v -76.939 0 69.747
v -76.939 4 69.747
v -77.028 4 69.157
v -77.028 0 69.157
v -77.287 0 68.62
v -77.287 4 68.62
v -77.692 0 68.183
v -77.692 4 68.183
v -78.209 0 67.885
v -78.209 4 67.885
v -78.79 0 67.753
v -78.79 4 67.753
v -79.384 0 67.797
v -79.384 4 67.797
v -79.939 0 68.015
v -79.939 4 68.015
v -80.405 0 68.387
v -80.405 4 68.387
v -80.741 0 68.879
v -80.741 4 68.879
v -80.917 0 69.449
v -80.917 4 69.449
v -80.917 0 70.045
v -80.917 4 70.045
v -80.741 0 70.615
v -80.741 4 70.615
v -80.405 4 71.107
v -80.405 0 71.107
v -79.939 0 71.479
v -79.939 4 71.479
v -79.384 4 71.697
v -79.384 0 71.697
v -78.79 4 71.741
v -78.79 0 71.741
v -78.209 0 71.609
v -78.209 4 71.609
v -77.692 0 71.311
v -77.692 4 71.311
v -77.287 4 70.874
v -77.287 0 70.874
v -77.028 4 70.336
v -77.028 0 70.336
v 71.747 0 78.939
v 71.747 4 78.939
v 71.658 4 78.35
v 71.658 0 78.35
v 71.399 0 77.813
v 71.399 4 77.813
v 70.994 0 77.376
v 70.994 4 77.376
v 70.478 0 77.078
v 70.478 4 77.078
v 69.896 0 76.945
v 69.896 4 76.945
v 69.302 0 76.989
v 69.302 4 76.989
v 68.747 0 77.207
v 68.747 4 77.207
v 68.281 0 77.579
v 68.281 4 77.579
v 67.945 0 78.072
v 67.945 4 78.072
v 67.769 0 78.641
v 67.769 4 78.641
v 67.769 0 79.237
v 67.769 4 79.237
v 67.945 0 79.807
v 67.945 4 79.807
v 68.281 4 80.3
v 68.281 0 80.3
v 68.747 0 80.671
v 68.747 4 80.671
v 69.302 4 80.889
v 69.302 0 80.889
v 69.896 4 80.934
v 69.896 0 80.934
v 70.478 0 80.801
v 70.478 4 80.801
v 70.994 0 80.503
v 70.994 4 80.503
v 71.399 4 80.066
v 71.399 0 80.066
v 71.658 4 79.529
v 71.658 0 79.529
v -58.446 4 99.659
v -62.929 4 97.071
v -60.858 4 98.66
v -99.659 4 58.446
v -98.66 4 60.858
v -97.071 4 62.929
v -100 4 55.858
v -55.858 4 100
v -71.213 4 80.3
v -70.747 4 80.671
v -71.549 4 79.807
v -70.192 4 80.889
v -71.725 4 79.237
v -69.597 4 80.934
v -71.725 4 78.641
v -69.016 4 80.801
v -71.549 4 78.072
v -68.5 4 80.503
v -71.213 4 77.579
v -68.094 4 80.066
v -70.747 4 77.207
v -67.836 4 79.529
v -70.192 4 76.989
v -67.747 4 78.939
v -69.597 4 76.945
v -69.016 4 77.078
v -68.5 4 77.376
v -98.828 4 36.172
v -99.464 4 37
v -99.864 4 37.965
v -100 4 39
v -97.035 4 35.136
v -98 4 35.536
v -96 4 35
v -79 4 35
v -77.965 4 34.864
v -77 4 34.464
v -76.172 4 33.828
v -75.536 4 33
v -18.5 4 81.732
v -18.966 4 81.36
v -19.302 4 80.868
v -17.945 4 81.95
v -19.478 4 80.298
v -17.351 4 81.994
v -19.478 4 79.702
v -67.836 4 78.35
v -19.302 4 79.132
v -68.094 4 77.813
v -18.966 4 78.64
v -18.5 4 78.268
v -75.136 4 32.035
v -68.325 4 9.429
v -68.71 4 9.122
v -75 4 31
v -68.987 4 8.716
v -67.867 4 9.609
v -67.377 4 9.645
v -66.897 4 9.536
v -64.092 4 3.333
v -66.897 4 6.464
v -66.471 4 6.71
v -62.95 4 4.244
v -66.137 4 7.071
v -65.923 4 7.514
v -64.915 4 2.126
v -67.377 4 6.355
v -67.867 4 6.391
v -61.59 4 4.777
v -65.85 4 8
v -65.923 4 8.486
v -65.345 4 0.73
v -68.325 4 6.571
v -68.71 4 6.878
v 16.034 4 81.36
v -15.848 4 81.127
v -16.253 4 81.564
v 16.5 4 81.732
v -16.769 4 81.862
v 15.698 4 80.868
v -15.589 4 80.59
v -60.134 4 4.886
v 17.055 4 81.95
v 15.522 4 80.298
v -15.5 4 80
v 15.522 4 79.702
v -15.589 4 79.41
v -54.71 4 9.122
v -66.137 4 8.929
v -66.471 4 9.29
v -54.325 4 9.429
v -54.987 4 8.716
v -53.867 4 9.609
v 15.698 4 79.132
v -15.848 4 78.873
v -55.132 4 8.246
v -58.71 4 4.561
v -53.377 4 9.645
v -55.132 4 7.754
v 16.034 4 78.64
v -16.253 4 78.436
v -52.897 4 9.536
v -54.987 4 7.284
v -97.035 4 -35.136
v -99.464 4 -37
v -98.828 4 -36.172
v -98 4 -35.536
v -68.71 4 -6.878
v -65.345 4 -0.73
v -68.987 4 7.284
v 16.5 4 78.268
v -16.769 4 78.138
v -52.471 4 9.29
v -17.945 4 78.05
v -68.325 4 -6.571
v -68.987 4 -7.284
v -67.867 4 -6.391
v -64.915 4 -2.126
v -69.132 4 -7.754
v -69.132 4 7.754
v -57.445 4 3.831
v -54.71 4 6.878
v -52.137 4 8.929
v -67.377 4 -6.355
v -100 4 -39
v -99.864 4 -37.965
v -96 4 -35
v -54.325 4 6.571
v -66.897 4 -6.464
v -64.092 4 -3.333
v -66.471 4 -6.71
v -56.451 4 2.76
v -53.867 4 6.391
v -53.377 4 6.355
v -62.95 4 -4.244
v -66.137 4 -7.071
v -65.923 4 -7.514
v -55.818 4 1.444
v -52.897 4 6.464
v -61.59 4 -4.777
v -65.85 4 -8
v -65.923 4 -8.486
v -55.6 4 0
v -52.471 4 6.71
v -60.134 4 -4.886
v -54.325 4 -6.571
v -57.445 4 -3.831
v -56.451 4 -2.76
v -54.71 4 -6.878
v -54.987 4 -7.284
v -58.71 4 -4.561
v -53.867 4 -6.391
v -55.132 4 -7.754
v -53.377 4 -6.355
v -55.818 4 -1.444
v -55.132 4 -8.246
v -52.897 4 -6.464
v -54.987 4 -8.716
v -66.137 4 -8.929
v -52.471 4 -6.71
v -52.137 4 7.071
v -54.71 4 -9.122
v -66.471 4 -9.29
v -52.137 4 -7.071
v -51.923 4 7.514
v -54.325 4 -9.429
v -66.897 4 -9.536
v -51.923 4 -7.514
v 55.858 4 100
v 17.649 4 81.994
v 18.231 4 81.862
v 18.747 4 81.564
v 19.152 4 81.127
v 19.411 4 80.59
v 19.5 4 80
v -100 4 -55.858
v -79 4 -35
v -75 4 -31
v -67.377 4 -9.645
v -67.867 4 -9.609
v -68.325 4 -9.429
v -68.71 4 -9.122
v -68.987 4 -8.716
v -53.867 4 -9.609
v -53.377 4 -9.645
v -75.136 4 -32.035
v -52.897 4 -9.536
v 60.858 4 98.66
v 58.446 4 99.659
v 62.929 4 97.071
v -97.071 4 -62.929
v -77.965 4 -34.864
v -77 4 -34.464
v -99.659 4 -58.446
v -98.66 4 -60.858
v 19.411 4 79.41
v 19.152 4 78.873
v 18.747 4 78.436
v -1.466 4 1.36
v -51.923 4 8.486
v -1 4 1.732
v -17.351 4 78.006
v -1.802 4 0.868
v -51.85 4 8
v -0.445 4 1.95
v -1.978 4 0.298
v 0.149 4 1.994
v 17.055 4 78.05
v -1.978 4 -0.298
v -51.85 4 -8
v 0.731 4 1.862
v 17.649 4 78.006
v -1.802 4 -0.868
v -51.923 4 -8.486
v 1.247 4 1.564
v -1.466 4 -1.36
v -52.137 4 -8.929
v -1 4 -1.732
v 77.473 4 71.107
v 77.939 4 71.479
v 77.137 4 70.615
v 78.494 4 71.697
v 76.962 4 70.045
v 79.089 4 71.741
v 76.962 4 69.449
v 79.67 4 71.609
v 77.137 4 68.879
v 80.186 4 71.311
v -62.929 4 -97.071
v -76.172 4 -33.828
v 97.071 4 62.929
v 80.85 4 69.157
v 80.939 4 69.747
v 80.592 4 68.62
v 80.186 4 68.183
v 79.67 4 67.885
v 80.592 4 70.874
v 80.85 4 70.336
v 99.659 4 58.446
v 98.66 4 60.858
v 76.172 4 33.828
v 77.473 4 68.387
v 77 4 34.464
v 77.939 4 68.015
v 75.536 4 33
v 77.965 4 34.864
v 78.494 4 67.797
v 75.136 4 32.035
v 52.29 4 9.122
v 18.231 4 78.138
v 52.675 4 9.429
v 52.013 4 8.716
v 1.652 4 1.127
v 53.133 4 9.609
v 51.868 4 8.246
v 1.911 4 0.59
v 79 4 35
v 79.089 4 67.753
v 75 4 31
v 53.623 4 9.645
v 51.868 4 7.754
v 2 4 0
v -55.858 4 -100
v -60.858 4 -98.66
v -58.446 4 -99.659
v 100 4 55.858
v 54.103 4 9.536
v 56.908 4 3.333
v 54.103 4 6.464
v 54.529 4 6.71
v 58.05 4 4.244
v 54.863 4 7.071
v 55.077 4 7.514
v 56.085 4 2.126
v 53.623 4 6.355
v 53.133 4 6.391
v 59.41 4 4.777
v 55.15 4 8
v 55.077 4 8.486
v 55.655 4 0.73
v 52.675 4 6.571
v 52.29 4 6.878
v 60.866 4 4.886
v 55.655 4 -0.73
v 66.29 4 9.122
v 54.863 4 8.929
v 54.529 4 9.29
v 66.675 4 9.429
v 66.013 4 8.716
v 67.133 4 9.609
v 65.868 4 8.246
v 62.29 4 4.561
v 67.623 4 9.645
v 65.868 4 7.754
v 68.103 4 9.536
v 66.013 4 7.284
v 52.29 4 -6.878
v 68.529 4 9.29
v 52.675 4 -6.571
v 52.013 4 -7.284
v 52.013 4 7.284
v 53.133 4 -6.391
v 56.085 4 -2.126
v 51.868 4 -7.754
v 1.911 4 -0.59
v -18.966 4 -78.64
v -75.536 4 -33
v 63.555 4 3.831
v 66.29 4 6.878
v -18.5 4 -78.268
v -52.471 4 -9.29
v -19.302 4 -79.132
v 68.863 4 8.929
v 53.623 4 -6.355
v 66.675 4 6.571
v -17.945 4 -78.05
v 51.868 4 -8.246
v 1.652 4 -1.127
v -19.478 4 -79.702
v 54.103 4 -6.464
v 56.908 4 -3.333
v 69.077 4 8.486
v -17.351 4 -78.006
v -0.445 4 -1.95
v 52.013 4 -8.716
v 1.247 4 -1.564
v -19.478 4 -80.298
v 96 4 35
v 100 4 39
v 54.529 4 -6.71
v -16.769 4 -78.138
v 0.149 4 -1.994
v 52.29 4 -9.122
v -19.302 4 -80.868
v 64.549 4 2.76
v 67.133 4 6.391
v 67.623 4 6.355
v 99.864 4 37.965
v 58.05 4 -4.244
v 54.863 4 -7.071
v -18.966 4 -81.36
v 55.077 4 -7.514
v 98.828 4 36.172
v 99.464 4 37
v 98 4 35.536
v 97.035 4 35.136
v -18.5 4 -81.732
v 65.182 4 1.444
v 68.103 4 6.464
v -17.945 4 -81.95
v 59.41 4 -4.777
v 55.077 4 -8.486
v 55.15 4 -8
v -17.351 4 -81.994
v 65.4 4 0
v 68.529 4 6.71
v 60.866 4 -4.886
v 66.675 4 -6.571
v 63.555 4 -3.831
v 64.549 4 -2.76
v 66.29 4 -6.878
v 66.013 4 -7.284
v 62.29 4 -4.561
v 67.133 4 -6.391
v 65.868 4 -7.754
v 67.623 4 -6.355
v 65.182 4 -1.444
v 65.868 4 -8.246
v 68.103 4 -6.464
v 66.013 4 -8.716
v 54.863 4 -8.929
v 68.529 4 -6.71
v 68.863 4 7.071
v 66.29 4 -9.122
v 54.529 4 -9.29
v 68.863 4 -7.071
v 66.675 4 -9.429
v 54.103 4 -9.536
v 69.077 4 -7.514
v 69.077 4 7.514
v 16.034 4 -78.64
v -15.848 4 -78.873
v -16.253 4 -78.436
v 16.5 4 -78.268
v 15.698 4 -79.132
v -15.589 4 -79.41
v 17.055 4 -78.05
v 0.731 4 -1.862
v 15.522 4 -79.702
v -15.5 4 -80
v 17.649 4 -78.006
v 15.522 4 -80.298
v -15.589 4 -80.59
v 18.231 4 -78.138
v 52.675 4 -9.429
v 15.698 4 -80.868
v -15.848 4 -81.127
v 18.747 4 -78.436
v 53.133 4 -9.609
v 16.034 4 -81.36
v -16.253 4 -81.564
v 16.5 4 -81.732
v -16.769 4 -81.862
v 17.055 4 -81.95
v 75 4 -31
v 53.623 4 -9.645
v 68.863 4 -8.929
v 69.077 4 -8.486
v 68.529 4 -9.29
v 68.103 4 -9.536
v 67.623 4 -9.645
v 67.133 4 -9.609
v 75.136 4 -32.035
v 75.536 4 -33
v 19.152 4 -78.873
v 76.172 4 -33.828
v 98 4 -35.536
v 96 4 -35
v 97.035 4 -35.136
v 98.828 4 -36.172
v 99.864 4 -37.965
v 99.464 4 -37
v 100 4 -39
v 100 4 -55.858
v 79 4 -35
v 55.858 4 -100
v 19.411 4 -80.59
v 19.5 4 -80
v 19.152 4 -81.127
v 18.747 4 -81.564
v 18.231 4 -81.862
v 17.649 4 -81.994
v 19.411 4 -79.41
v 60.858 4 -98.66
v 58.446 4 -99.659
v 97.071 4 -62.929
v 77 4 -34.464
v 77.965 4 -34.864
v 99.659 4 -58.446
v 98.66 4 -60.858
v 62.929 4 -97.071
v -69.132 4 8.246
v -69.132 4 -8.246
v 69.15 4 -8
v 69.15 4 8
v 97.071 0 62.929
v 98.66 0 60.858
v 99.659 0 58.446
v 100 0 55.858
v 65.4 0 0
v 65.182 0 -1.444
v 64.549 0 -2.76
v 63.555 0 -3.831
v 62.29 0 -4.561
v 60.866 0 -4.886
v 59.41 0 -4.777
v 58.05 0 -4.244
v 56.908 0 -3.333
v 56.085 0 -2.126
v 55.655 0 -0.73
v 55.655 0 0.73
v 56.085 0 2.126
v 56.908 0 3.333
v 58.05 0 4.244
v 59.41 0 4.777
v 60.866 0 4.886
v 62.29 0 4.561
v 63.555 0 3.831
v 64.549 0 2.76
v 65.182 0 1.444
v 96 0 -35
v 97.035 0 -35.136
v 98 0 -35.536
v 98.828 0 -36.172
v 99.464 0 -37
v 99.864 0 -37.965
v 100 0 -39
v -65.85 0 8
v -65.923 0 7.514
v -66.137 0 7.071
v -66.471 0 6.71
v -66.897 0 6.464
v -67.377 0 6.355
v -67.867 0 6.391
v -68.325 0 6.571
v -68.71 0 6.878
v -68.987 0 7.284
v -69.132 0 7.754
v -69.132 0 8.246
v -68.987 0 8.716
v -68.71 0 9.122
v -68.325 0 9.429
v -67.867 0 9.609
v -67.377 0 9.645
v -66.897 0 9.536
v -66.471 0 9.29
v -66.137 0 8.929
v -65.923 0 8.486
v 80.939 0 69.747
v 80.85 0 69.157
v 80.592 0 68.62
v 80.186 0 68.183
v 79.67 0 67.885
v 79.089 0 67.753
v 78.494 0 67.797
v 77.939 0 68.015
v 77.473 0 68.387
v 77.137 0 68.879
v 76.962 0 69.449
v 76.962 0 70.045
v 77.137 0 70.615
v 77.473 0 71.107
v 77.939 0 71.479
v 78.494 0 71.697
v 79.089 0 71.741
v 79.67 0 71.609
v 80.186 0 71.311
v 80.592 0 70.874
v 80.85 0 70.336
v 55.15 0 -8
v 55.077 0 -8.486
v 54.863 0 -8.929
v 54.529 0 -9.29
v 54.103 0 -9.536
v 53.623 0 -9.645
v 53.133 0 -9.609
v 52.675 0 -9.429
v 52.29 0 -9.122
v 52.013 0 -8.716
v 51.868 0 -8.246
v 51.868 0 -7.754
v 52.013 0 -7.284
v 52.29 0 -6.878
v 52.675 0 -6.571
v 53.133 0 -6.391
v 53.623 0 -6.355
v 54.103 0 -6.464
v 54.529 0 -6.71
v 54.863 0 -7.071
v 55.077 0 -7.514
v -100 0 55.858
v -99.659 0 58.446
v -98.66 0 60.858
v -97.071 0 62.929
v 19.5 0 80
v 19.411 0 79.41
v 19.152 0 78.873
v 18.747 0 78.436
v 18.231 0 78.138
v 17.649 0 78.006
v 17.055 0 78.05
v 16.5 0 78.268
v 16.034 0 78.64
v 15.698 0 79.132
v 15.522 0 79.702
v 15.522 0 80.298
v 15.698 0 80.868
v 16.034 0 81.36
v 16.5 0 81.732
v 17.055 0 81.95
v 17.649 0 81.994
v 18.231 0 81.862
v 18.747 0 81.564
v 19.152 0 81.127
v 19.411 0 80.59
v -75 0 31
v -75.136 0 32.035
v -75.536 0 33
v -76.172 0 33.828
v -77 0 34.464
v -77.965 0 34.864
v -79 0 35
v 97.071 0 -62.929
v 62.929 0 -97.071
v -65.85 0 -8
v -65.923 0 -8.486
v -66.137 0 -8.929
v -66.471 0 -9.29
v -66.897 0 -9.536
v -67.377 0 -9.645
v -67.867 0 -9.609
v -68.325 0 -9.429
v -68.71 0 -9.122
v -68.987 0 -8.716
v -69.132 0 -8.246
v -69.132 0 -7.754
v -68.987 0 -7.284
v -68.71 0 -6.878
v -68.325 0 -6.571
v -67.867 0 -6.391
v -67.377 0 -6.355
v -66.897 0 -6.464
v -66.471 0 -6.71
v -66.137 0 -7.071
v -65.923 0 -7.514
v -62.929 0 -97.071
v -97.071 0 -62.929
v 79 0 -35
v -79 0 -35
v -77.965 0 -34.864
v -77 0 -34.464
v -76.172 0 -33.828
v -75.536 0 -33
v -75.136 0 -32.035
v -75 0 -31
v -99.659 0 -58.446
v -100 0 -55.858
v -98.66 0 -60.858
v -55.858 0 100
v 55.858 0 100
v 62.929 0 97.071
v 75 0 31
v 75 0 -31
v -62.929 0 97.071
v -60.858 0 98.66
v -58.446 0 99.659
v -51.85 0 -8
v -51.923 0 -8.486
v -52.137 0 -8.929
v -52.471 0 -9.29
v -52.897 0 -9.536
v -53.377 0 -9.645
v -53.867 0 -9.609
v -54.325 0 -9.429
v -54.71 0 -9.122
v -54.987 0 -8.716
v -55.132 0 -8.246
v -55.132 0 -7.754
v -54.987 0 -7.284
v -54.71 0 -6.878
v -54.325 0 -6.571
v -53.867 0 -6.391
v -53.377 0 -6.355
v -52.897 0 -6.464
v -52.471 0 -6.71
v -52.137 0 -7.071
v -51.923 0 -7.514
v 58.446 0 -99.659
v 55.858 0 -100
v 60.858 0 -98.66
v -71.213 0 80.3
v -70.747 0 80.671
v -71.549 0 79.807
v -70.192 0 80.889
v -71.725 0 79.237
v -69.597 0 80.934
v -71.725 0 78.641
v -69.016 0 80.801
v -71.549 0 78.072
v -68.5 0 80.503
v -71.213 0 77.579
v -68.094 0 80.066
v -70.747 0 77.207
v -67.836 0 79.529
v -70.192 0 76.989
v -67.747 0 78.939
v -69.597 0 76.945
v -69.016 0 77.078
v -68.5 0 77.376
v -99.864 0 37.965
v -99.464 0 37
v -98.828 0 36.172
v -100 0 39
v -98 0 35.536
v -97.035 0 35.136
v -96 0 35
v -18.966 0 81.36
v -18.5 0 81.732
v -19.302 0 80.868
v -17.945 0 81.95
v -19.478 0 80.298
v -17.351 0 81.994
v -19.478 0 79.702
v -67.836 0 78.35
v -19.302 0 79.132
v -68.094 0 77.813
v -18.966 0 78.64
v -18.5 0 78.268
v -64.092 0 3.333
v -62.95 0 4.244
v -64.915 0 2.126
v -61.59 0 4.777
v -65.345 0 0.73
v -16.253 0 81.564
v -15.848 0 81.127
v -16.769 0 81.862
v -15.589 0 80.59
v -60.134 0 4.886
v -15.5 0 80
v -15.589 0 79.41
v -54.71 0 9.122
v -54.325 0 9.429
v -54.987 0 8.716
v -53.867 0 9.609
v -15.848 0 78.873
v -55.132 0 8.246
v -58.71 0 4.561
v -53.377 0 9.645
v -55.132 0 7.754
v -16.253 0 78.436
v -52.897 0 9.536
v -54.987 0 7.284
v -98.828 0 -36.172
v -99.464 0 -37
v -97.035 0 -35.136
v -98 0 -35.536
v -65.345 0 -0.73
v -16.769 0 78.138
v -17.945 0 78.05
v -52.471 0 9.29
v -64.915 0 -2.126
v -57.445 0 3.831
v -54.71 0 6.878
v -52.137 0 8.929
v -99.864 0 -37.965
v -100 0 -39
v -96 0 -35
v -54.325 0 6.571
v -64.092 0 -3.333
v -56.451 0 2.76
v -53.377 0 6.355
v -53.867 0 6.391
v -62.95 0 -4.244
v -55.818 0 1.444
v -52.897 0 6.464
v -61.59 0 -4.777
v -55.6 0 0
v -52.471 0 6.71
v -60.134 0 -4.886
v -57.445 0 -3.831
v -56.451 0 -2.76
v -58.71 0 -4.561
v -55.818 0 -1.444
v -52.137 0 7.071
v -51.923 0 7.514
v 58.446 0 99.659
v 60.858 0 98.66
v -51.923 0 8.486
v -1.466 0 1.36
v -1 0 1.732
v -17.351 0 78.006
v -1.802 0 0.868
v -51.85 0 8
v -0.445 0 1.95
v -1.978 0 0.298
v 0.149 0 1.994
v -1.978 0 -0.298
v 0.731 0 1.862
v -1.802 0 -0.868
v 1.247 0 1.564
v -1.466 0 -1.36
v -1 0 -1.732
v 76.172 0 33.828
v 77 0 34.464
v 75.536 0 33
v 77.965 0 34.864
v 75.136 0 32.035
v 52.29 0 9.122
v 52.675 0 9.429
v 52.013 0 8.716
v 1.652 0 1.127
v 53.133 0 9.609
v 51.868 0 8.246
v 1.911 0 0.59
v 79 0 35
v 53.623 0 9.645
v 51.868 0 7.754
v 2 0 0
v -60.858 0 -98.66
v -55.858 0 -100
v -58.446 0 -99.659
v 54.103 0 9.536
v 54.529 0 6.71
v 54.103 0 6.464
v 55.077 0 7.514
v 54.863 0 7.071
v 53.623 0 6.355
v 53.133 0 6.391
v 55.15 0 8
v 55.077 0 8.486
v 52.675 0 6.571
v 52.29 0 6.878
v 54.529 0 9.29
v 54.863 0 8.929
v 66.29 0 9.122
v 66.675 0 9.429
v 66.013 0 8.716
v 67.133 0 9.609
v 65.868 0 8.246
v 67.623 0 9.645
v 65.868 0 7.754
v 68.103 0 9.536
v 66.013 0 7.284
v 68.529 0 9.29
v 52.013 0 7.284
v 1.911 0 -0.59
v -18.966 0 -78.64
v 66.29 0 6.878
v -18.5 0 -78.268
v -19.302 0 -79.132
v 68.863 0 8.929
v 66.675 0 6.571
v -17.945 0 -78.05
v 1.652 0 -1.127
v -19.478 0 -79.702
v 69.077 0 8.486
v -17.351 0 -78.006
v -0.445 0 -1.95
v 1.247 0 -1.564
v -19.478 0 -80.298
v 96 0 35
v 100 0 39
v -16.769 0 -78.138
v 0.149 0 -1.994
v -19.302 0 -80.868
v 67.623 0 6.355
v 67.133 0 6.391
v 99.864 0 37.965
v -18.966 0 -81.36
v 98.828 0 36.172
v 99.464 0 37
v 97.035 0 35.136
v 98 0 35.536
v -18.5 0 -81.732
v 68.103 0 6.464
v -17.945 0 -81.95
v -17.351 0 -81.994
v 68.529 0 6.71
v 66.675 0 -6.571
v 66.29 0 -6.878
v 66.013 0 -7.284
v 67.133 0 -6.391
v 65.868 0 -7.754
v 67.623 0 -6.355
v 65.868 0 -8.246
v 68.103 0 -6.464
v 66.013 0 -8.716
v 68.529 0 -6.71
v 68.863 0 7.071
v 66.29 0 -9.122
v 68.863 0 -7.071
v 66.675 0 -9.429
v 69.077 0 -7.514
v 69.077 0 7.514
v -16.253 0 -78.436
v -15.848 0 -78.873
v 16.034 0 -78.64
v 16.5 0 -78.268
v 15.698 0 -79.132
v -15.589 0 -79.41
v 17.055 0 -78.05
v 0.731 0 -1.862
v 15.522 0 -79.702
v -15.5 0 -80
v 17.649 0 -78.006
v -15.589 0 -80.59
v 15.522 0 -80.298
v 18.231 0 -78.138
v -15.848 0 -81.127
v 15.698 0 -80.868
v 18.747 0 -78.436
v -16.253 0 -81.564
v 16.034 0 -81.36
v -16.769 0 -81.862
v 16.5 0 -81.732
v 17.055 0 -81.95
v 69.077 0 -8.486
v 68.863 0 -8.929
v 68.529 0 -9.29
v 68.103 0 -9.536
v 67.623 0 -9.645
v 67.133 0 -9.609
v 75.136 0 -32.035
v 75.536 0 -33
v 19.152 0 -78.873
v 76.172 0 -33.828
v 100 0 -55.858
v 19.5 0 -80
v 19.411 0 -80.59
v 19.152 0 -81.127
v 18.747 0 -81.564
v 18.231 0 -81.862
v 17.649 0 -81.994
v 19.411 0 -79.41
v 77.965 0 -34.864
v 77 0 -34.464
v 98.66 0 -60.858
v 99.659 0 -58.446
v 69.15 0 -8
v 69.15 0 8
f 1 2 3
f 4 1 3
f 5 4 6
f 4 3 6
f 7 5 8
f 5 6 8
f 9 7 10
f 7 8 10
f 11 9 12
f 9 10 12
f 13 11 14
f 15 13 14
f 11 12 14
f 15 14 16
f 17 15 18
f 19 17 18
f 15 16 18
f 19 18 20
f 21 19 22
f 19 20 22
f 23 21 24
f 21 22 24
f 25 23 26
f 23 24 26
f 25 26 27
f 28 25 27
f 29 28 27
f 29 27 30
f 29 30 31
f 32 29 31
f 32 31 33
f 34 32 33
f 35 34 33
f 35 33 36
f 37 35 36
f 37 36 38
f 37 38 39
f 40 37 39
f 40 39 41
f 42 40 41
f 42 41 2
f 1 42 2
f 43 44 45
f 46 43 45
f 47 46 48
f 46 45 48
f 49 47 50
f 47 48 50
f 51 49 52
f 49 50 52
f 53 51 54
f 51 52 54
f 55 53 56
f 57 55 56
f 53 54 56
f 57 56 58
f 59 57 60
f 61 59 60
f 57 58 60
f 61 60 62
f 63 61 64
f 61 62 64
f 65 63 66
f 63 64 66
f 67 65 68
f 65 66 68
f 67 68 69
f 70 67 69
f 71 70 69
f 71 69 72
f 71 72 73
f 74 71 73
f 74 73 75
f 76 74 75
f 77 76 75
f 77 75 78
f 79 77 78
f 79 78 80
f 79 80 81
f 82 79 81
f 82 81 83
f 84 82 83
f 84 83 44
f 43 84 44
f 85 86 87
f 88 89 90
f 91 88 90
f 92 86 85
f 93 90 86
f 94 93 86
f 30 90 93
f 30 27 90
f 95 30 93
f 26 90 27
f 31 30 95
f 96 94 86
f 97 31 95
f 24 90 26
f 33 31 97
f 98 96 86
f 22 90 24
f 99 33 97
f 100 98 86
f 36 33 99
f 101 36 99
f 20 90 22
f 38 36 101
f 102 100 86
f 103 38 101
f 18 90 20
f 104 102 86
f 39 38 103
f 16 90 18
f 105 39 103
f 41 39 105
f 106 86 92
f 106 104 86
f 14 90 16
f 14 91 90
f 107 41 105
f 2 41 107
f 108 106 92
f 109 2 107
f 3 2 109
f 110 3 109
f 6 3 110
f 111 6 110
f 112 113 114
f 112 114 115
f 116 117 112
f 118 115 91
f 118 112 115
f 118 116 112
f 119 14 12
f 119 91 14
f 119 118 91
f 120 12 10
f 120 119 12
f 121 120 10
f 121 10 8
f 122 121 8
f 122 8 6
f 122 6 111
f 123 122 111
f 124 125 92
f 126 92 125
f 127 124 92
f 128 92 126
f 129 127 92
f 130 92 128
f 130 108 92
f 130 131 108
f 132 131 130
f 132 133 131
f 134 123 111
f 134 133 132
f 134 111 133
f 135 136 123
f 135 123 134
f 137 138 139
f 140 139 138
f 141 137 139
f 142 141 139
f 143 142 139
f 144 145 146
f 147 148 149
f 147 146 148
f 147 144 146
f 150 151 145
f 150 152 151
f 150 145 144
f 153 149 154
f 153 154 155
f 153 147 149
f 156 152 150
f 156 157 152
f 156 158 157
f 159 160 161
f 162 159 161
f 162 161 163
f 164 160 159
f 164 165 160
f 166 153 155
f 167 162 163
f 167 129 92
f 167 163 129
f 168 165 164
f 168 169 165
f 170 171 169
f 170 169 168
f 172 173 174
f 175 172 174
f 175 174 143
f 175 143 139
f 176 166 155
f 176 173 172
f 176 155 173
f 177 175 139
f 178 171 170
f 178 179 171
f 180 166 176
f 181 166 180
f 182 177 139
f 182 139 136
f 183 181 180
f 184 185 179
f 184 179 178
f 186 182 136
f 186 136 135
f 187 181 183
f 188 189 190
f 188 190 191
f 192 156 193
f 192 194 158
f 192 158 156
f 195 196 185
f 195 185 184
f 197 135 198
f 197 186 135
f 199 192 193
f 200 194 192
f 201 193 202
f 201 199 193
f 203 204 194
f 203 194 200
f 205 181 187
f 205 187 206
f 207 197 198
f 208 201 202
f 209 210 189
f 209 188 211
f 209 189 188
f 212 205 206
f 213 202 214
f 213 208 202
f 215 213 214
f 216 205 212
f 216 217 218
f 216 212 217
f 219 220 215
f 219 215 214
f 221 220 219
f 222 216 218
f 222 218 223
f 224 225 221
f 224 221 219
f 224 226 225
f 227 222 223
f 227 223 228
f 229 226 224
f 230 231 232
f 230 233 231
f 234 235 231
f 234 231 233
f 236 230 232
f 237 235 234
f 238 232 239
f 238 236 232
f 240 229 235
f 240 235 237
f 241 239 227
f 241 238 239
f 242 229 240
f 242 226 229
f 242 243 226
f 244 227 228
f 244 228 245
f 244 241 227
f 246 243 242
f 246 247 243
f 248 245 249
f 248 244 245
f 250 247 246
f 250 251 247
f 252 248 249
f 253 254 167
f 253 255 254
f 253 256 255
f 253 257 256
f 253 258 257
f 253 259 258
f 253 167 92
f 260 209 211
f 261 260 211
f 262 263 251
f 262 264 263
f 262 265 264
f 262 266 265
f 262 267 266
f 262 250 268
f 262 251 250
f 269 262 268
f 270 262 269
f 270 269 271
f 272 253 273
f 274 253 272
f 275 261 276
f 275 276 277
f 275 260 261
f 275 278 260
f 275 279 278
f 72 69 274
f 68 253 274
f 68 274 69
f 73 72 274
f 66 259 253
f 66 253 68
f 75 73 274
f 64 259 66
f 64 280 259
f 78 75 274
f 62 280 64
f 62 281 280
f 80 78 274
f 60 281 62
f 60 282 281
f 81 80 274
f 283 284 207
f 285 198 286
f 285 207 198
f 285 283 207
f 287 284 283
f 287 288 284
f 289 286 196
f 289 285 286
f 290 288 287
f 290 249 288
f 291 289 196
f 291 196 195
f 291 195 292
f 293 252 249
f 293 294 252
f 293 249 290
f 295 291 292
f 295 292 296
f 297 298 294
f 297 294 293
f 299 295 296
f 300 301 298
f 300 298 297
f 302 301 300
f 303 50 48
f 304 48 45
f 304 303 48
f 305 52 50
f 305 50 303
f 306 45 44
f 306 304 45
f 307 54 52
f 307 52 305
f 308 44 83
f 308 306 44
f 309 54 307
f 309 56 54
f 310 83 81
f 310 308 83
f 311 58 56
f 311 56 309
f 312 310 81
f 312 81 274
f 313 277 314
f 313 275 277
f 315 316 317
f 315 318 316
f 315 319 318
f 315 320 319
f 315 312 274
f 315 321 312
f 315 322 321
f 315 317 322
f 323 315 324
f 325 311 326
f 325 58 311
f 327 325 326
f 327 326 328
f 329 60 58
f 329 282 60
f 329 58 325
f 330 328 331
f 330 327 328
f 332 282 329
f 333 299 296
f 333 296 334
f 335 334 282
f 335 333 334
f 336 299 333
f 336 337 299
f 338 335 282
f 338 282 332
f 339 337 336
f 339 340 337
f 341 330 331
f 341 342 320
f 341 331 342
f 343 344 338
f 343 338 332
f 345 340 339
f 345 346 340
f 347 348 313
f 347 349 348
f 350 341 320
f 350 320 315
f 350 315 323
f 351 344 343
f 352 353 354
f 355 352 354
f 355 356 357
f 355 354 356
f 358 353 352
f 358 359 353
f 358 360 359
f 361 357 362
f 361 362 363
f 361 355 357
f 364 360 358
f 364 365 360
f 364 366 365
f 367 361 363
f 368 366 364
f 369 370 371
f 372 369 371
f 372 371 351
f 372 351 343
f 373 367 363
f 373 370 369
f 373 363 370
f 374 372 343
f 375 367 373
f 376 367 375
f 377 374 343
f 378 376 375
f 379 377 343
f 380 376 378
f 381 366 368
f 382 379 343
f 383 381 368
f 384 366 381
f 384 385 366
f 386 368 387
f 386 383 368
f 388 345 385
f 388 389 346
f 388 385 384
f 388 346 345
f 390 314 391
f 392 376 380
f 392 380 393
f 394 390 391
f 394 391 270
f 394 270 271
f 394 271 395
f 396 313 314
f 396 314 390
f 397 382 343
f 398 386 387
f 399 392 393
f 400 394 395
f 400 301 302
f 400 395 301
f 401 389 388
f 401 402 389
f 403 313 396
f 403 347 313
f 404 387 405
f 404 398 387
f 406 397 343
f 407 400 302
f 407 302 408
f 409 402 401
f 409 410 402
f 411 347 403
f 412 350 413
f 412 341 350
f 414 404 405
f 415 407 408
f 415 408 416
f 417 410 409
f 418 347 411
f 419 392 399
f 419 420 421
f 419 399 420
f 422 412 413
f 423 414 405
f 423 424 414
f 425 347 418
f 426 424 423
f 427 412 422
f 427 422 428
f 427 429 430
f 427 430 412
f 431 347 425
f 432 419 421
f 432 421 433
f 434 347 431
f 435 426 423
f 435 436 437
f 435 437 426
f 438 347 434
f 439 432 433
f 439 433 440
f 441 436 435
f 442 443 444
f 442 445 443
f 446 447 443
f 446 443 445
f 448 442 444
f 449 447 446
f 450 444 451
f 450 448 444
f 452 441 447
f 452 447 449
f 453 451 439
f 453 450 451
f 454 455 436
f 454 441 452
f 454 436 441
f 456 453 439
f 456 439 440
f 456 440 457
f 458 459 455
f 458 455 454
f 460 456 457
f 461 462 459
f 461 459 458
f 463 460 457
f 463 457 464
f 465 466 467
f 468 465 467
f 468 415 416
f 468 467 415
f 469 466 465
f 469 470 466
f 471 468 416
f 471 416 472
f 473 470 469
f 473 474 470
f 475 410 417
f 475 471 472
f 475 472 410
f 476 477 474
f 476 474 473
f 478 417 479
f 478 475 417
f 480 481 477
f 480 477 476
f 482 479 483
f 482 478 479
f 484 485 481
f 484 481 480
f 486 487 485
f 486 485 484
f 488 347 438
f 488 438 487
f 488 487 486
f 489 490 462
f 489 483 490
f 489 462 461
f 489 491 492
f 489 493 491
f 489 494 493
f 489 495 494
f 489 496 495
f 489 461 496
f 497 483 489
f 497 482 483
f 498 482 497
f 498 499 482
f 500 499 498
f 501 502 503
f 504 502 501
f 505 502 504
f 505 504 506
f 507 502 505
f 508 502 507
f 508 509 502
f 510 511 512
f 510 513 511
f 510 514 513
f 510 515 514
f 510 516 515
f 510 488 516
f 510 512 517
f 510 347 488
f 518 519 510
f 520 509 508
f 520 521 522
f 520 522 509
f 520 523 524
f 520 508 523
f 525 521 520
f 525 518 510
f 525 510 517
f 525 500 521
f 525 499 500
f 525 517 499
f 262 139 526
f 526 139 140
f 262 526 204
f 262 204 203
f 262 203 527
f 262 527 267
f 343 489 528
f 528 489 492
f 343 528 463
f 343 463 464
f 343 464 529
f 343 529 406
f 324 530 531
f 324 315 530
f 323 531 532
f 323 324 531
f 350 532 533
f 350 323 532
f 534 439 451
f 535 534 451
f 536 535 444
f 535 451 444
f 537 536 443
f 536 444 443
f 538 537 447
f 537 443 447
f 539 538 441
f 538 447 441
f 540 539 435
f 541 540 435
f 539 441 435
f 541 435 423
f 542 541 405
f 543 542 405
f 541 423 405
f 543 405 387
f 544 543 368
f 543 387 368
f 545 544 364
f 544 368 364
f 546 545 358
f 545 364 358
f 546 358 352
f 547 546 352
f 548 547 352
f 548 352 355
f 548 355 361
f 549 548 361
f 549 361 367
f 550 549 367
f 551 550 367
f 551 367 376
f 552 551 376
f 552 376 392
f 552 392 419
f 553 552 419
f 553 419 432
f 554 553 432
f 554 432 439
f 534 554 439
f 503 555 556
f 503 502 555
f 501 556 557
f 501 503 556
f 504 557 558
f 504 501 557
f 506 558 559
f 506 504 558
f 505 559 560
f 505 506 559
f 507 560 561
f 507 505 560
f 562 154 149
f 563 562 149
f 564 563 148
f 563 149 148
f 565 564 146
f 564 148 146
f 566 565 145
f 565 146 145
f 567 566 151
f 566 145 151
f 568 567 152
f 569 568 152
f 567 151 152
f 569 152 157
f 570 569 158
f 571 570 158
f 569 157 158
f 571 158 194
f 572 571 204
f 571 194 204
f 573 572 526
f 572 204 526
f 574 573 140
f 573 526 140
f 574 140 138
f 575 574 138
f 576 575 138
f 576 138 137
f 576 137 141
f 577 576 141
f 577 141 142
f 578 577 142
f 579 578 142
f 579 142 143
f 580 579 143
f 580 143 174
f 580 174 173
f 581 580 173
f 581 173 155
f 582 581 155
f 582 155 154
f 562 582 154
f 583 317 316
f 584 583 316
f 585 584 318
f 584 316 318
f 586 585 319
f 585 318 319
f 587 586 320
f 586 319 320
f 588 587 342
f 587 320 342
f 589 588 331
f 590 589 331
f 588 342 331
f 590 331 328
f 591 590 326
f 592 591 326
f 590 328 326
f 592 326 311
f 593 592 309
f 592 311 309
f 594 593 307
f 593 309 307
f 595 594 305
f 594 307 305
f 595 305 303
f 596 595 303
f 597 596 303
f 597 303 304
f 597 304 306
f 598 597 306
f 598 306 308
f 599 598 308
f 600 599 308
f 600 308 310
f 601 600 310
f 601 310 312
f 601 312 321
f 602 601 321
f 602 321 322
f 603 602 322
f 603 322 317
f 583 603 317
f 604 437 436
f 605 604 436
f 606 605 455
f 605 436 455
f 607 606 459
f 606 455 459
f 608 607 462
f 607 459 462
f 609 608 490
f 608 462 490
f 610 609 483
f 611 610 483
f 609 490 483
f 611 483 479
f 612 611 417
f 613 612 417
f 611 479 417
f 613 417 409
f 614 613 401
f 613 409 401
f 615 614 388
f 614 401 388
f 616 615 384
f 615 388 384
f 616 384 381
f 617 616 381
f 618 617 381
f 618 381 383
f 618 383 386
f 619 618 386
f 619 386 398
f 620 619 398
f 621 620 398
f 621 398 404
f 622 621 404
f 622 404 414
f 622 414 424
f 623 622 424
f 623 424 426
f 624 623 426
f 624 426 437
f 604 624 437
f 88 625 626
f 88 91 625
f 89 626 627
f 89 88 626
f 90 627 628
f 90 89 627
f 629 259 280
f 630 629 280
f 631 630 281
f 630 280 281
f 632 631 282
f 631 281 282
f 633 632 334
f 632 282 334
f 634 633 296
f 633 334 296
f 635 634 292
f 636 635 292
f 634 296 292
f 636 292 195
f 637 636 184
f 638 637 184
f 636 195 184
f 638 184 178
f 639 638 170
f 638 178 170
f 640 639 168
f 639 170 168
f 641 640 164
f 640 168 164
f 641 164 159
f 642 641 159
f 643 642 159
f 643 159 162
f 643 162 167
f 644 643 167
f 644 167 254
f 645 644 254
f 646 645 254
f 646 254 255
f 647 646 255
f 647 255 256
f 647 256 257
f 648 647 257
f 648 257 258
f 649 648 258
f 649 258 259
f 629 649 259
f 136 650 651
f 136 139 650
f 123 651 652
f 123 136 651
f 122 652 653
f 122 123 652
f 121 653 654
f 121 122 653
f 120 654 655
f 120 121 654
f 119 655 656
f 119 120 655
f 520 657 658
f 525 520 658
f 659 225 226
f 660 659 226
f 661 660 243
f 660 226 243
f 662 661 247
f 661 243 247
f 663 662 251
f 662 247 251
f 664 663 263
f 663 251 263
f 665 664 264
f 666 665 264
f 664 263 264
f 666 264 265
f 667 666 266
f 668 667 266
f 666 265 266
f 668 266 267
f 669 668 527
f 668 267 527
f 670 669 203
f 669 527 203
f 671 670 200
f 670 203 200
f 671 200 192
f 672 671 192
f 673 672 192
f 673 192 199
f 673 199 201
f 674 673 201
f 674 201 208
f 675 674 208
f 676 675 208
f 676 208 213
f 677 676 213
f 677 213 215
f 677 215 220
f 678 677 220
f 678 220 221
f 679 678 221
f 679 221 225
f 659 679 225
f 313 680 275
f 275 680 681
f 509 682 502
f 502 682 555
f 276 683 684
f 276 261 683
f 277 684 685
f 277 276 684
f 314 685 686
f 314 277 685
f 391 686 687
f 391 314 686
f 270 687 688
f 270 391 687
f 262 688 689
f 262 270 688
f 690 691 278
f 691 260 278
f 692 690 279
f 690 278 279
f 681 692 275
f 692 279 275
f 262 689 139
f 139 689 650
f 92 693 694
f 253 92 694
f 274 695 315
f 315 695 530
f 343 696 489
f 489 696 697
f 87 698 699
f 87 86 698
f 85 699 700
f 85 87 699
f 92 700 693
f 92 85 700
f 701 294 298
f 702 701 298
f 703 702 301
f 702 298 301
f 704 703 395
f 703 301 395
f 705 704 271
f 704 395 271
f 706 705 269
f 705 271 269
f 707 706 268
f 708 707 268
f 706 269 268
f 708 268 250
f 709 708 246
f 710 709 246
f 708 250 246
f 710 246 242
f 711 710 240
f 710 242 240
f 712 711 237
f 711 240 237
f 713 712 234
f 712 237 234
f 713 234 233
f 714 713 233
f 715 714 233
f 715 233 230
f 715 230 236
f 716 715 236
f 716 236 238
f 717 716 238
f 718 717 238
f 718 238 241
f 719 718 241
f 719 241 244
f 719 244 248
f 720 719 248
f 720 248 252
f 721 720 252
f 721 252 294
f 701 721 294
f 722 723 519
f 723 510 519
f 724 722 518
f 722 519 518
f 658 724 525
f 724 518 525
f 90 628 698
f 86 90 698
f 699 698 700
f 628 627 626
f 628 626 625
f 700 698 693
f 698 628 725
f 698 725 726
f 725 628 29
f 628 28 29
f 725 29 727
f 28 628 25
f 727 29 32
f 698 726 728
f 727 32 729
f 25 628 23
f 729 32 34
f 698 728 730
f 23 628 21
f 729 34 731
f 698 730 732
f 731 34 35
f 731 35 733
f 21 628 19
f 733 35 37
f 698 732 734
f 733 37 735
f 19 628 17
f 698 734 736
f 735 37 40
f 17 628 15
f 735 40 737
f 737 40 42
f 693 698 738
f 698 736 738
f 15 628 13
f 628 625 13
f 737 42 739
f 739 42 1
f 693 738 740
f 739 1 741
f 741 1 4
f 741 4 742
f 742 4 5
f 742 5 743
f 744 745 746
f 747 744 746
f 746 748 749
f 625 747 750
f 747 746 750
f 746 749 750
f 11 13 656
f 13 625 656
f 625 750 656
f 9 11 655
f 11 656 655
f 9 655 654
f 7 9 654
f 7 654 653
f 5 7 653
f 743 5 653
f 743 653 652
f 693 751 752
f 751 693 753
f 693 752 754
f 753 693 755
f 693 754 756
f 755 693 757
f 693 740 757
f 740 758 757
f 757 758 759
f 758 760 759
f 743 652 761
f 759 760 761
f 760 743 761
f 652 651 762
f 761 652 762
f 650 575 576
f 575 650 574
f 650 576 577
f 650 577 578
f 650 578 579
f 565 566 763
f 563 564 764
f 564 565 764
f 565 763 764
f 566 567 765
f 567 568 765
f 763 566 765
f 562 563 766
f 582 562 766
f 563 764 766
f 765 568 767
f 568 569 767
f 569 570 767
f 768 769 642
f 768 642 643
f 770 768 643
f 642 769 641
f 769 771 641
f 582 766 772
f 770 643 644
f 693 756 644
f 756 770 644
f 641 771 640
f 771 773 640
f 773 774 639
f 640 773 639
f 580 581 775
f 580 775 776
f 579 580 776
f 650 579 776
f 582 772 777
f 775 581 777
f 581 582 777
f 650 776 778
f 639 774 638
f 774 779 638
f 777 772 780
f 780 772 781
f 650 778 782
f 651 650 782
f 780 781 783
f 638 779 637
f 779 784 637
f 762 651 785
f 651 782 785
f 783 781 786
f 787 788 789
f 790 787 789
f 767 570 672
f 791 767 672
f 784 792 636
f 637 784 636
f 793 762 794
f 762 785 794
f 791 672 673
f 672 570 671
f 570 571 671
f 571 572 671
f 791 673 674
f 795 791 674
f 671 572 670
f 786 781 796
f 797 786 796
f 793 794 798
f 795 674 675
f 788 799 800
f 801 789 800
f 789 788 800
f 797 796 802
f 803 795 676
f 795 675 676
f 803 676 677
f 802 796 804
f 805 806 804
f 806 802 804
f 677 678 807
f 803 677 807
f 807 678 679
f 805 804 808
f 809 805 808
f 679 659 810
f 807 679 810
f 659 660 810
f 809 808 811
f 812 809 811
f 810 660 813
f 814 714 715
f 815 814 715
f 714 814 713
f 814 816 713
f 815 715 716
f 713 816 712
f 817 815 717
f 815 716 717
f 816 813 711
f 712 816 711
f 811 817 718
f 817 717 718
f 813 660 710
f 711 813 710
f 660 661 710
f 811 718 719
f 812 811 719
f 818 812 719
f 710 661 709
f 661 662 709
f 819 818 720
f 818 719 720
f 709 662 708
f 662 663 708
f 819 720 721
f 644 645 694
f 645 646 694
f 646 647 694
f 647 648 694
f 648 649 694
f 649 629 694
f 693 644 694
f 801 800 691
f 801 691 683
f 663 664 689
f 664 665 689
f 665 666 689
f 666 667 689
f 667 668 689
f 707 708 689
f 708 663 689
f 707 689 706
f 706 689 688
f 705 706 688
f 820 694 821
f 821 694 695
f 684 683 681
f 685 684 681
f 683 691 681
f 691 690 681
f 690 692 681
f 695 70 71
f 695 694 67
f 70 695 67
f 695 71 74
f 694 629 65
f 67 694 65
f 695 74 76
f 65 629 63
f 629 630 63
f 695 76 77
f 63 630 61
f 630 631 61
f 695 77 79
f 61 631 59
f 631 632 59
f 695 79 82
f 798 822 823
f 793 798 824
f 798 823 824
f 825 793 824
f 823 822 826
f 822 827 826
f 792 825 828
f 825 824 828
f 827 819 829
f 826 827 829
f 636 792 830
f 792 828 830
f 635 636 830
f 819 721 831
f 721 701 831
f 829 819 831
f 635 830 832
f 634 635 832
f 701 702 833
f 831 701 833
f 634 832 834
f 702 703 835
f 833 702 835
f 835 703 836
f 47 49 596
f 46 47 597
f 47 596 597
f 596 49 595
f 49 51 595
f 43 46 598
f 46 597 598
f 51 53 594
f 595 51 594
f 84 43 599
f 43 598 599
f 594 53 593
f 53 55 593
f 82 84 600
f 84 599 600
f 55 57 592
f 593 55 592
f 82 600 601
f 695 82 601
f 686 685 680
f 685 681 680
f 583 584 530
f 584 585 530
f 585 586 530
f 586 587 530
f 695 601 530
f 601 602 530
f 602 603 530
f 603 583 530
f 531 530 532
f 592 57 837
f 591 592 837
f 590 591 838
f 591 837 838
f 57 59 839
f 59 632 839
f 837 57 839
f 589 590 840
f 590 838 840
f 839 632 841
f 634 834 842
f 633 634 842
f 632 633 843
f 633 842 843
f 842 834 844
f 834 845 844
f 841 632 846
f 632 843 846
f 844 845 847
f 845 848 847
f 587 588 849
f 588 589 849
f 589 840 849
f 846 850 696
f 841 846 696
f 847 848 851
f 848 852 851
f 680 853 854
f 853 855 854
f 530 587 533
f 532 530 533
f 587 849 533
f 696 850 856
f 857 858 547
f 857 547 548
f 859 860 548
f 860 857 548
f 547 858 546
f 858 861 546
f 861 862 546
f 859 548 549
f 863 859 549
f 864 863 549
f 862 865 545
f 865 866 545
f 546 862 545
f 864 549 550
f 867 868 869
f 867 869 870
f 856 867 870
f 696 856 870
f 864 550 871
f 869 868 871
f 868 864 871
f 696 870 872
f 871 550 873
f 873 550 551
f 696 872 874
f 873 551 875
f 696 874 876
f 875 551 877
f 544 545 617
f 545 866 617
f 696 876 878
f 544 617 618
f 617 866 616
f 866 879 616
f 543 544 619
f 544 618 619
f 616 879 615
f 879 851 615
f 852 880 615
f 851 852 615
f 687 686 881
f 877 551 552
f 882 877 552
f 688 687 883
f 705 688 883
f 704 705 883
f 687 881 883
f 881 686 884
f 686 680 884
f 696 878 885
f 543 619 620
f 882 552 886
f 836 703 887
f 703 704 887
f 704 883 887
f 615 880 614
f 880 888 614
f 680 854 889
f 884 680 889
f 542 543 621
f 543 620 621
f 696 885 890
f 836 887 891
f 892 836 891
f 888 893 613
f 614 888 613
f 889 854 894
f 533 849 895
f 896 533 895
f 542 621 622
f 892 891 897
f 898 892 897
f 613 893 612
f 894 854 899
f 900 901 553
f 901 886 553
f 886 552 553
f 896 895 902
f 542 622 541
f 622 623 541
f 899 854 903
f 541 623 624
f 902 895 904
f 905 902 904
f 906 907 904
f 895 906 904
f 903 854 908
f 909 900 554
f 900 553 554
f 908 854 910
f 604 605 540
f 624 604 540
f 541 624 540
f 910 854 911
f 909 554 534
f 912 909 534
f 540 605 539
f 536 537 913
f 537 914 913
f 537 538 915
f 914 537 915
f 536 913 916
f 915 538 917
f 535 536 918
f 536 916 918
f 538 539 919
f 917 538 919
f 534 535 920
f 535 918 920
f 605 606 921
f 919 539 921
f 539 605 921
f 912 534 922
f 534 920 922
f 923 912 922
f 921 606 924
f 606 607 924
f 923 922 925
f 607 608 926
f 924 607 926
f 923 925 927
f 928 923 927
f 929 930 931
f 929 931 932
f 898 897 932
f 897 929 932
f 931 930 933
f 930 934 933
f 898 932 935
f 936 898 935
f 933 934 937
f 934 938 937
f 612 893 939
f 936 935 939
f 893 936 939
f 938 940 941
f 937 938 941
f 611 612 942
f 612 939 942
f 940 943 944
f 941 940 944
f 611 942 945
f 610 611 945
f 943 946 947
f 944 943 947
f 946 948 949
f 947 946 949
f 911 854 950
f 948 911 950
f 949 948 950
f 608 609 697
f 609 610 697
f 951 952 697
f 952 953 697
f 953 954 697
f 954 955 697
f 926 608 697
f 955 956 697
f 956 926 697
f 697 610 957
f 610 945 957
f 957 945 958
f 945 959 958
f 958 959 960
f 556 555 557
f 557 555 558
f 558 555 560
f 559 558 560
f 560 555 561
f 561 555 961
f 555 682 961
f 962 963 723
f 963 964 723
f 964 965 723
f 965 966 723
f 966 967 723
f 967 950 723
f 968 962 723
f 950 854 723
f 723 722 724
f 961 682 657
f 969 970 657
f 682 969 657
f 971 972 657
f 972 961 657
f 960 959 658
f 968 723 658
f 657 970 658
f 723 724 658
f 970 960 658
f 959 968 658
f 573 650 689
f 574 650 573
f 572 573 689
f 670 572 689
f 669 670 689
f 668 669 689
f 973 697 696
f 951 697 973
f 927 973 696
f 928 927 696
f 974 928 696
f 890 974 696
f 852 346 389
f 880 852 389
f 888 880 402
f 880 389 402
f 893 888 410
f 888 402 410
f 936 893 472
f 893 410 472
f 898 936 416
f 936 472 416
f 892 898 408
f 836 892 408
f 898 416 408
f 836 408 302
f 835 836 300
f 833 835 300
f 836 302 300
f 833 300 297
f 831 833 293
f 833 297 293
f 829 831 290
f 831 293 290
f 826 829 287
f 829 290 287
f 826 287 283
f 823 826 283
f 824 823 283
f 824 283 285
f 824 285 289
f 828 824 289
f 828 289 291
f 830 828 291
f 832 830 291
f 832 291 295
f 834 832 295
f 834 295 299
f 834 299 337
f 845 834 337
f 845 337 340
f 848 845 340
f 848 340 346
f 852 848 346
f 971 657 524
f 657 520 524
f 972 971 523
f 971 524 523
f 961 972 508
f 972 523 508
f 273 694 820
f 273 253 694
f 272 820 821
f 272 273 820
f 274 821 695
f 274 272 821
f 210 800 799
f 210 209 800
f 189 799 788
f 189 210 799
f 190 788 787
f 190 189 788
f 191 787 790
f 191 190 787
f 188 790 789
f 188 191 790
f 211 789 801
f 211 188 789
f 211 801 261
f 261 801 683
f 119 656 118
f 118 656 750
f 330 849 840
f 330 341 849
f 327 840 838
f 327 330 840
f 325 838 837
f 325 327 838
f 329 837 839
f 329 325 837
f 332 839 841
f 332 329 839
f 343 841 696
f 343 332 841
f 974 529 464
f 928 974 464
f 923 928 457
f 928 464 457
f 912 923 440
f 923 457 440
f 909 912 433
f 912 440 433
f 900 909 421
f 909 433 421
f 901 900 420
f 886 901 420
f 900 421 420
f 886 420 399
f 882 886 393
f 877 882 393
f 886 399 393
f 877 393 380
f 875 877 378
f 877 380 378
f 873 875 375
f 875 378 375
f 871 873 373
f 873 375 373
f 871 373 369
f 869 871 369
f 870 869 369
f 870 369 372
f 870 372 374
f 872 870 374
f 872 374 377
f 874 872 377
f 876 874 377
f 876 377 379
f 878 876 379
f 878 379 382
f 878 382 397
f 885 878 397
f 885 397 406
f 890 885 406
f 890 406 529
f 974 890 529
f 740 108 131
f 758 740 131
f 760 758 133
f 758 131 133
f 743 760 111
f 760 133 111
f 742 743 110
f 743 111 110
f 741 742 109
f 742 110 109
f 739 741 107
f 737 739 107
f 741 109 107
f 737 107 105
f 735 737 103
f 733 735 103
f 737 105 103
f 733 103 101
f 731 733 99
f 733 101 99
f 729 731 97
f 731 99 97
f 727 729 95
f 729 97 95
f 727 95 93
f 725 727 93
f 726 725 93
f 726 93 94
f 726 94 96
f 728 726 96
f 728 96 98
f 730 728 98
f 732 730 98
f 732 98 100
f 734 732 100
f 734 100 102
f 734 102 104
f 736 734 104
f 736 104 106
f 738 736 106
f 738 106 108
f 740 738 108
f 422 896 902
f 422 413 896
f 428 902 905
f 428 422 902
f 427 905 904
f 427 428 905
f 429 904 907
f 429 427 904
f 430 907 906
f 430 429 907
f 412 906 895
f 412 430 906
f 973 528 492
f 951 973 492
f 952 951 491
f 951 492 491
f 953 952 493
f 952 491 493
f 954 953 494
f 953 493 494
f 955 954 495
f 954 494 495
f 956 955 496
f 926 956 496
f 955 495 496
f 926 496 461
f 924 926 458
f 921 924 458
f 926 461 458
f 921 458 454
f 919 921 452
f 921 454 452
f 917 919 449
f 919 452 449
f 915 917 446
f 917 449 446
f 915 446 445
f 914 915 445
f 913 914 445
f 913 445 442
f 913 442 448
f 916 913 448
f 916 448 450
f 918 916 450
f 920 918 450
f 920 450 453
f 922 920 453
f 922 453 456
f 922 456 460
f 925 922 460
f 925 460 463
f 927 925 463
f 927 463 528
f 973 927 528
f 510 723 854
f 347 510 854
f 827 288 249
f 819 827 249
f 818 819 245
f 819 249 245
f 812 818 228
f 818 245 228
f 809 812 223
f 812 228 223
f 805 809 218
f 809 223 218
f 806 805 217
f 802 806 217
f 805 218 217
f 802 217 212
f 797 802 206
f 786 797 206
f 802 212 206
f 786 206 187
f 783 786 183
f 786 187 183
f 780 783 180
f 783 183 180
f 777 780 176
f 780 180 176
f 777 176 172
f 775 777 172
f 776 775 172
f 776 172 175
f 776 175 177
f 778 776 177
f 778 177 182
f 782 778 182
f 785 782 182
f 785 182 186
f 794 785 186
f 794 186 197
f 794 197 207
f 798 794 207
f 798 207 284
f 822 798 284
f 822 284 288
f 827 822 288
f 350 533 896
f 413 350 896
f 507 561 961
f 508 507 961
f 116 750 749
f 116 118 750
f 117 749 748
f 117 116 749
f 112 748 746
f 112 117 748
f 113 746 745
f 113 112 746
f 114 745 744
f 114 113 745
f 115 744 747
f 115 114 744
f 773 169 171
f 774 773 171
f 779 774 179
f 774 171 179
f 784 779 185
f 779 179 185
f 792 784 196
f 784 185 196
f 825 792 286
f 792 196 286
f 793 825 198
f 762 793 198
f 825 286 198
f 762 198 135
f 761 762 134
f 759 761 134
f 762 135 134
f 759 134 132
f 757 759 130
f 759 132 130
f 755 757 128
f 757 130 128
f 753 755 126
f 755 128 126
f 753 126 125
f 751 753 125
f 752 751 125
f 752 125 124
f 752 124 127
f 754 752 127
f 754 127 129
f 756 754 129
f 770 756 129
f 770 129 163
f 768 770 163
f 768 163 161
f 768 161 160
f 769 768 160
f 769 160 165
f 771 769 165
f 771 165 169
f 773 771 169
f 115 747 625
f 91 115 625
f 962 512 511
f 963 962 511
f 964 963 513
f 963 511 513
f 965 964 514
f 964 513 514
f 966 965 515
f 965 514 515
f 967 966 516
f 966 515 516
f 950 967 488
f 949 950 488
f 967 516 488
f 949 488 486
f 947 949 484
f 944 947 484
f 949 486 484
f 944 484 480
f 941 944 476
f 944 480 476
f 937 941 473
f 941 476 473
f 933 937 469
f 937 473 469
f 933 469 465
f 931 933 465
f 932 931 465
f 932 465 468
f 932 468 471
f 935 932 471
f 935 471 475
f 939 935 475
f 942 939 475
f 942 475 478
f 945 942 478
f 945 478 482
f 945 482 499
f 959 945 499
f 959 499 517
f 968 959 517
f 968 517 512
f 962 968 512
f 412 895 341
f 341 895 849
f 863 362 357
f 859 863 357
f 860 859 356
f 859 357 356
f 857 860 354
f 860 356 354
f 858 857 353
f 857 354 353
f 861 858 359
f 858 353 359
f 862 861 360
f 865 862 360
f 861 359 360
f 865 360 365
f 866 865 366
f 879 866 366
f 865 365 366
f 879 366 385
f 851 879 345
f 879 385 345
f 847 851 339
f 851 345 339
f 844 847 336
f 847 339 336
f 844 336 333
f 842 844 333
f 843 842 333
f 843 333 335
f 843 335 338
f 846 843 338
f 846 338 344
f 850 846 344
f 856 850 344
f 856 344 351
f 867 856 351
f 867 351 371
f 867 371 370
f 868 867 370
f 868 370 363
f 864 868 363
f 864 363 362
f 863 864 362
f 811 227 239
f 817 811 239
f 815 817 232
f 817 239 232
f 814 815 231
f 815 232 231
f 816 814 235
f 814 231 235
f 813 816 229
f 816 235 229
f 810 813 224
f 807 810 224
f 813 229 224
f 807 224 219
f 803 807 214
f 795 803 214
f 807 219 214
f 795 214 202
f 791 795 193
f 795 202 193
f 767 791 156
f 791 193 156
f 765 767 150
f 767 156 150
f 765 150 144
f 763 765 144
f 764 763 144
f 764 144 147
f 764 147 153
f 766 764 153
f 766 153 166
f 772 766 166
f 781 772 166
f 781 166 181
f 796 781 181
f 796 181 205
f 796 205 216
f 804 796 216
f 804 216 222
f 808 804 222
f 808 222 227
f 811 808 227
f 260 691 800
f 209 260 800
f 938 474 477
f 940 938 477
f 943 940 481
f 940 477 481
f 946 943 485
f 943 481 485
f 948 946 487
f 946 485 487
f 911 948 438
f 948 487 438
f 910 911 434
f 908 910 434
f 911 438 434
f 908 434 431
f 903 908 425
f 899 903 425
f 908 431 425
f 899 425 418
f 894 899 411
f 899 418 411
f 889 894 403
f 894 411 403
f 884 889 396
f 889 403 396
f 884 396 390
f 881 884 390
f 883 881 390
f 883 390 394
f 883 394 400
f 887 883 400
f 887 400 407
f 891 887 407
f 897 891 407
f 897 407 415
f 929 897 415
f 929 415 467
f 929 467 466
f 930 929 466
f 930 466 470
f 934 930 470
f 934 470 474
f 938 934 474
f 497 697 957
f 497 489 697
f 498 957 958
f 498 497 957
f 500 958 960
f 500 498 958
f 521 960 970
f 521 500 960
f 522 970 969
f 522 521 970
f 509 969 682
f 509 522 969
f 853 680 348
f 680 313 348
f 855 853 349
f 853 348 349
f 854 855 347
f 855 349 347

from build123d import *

# Parameters (mm, degrees)
EXTRUDE_1_DEPTH     = 4
FILLET_1_R          = 4
FILLET_2_R          = 10
SKETCH_8_R          = 4.9
SKETCH_8_R_2        = 1.65
SKETCH_8_R_3        = 2
CUT_EXTRUDE_1_DEPTH = 5


with BuildPart() as part:
    # 草图1 → 凸台-拉伸1 (new body)
    with BuildSketch(Plane(origin=(0, 0, 0), x_dir=(1, 0, 0), z_dir=(0, 1, 0))):
        Polygon((60, 100), (-60, 100), (-100, 60), (-100, 35), (-75, 35), (-75, -35), (-100, -35), (-100, -60), (-60, -100), (60, -100), (100, -60), (100, -35), (75, -35), (75, 35), (100, 35), (100, 60), align=None)
    extrude(amount=EXTRUDE_1_DEPTH)

    # 圆角1
    fillet_1_edges = [part.edges().sort_by_distance(p)[0] for p in [
        (100, 2, 35),
        (-100, 2, 35),
        (-75, 2, 35),
        (-75, 2, -35),
        (-100, 2, -35),
        (100, 2, -35),
        (75, 2, -35),
        (75, 2, 35),
    ]]
    fillet(fillet_1_edges, radius=FILLET_1_R)

    # 圆角2
    fillet_2_edges = [part.edges().sort_by_distance(p)[0] for p in [
        (100, 2, 60),
        (60, 2, 100),
        (-60, 2, 100),
        (-100, 2, 60),
        (-100, 2, -60),
        (-60, 2, -100),
        (60, 2, -100),
        (100, 2, -60),
    ]]
    fillet(fillet_2_edges, radius=FILLET_2_R)

    # 草图8 → 切除-拉伸1 (cut, through all)
    with BuildSketch(Plane(origin=(0, 4, 0), x_dir=(1, 0, 0), z_dir=(0, 1, 0))):
        with Locations((-60.5, 0)):
            Circle(SKETCH_8_R)
        with Locations((-67.5, 8)):
            Circle(SKETCH_8_R_2)
        with Locations((-53.5, 8)):
            Circle(SKETCH_8_R_2)
        with Locations((-53.5, -8)):
            Circle(SKETCH_8_R_2)
        with Locations((-67.5, -8)):
            Circle(SKETCH_8_R_2)
        with Locations((53.5, -8)):
            Circle(SKETCH_8_R_2)
        with Locations((67.5, -8)):
            Circle(SKETCH_8_R_2)
        with Locations((60.5, 0)):
            Circle(SKETCH_8_R)
        with Locations((53.5, 8)):
            Circle(SKETCH_8_R_2)
        with Locations((67.5, 8)):
            Circle(SKETCH_8_R_2)
        with Locations((-17.5, 80)):
            Circle(SKETCH_8_R_3)
        with Locations((17.5, 80)):
            Circle(SKETCH_8_R_3)
        with Locations((17.5, -80)):
            Circle(SKETCH_8_R_3)
        with Locations((-17.5, -80)):
            Circle(SKETCH_8_R_3)
        Circle(SKETCH_8_R_3)
        with Locations((-78.939339828, -69.746951673)):
            Circle(SKETCH_8_R_3)
        with Locations((-69.746951673, -78.939339828)):
            Circle(SKETCH_8_R_3)
        with Locations((69.746951673, -78.939339828)):
            Circle(SKETCH_8_R_3)
        with Locations((78.939339828, -69.746951673)):
            Circle(SKETCH_8_R_3)
    extrude(amount=-CUT_EXTRUDE_1_DEPTH, mode=Mode.SUBTRACT)


solid = part.part
